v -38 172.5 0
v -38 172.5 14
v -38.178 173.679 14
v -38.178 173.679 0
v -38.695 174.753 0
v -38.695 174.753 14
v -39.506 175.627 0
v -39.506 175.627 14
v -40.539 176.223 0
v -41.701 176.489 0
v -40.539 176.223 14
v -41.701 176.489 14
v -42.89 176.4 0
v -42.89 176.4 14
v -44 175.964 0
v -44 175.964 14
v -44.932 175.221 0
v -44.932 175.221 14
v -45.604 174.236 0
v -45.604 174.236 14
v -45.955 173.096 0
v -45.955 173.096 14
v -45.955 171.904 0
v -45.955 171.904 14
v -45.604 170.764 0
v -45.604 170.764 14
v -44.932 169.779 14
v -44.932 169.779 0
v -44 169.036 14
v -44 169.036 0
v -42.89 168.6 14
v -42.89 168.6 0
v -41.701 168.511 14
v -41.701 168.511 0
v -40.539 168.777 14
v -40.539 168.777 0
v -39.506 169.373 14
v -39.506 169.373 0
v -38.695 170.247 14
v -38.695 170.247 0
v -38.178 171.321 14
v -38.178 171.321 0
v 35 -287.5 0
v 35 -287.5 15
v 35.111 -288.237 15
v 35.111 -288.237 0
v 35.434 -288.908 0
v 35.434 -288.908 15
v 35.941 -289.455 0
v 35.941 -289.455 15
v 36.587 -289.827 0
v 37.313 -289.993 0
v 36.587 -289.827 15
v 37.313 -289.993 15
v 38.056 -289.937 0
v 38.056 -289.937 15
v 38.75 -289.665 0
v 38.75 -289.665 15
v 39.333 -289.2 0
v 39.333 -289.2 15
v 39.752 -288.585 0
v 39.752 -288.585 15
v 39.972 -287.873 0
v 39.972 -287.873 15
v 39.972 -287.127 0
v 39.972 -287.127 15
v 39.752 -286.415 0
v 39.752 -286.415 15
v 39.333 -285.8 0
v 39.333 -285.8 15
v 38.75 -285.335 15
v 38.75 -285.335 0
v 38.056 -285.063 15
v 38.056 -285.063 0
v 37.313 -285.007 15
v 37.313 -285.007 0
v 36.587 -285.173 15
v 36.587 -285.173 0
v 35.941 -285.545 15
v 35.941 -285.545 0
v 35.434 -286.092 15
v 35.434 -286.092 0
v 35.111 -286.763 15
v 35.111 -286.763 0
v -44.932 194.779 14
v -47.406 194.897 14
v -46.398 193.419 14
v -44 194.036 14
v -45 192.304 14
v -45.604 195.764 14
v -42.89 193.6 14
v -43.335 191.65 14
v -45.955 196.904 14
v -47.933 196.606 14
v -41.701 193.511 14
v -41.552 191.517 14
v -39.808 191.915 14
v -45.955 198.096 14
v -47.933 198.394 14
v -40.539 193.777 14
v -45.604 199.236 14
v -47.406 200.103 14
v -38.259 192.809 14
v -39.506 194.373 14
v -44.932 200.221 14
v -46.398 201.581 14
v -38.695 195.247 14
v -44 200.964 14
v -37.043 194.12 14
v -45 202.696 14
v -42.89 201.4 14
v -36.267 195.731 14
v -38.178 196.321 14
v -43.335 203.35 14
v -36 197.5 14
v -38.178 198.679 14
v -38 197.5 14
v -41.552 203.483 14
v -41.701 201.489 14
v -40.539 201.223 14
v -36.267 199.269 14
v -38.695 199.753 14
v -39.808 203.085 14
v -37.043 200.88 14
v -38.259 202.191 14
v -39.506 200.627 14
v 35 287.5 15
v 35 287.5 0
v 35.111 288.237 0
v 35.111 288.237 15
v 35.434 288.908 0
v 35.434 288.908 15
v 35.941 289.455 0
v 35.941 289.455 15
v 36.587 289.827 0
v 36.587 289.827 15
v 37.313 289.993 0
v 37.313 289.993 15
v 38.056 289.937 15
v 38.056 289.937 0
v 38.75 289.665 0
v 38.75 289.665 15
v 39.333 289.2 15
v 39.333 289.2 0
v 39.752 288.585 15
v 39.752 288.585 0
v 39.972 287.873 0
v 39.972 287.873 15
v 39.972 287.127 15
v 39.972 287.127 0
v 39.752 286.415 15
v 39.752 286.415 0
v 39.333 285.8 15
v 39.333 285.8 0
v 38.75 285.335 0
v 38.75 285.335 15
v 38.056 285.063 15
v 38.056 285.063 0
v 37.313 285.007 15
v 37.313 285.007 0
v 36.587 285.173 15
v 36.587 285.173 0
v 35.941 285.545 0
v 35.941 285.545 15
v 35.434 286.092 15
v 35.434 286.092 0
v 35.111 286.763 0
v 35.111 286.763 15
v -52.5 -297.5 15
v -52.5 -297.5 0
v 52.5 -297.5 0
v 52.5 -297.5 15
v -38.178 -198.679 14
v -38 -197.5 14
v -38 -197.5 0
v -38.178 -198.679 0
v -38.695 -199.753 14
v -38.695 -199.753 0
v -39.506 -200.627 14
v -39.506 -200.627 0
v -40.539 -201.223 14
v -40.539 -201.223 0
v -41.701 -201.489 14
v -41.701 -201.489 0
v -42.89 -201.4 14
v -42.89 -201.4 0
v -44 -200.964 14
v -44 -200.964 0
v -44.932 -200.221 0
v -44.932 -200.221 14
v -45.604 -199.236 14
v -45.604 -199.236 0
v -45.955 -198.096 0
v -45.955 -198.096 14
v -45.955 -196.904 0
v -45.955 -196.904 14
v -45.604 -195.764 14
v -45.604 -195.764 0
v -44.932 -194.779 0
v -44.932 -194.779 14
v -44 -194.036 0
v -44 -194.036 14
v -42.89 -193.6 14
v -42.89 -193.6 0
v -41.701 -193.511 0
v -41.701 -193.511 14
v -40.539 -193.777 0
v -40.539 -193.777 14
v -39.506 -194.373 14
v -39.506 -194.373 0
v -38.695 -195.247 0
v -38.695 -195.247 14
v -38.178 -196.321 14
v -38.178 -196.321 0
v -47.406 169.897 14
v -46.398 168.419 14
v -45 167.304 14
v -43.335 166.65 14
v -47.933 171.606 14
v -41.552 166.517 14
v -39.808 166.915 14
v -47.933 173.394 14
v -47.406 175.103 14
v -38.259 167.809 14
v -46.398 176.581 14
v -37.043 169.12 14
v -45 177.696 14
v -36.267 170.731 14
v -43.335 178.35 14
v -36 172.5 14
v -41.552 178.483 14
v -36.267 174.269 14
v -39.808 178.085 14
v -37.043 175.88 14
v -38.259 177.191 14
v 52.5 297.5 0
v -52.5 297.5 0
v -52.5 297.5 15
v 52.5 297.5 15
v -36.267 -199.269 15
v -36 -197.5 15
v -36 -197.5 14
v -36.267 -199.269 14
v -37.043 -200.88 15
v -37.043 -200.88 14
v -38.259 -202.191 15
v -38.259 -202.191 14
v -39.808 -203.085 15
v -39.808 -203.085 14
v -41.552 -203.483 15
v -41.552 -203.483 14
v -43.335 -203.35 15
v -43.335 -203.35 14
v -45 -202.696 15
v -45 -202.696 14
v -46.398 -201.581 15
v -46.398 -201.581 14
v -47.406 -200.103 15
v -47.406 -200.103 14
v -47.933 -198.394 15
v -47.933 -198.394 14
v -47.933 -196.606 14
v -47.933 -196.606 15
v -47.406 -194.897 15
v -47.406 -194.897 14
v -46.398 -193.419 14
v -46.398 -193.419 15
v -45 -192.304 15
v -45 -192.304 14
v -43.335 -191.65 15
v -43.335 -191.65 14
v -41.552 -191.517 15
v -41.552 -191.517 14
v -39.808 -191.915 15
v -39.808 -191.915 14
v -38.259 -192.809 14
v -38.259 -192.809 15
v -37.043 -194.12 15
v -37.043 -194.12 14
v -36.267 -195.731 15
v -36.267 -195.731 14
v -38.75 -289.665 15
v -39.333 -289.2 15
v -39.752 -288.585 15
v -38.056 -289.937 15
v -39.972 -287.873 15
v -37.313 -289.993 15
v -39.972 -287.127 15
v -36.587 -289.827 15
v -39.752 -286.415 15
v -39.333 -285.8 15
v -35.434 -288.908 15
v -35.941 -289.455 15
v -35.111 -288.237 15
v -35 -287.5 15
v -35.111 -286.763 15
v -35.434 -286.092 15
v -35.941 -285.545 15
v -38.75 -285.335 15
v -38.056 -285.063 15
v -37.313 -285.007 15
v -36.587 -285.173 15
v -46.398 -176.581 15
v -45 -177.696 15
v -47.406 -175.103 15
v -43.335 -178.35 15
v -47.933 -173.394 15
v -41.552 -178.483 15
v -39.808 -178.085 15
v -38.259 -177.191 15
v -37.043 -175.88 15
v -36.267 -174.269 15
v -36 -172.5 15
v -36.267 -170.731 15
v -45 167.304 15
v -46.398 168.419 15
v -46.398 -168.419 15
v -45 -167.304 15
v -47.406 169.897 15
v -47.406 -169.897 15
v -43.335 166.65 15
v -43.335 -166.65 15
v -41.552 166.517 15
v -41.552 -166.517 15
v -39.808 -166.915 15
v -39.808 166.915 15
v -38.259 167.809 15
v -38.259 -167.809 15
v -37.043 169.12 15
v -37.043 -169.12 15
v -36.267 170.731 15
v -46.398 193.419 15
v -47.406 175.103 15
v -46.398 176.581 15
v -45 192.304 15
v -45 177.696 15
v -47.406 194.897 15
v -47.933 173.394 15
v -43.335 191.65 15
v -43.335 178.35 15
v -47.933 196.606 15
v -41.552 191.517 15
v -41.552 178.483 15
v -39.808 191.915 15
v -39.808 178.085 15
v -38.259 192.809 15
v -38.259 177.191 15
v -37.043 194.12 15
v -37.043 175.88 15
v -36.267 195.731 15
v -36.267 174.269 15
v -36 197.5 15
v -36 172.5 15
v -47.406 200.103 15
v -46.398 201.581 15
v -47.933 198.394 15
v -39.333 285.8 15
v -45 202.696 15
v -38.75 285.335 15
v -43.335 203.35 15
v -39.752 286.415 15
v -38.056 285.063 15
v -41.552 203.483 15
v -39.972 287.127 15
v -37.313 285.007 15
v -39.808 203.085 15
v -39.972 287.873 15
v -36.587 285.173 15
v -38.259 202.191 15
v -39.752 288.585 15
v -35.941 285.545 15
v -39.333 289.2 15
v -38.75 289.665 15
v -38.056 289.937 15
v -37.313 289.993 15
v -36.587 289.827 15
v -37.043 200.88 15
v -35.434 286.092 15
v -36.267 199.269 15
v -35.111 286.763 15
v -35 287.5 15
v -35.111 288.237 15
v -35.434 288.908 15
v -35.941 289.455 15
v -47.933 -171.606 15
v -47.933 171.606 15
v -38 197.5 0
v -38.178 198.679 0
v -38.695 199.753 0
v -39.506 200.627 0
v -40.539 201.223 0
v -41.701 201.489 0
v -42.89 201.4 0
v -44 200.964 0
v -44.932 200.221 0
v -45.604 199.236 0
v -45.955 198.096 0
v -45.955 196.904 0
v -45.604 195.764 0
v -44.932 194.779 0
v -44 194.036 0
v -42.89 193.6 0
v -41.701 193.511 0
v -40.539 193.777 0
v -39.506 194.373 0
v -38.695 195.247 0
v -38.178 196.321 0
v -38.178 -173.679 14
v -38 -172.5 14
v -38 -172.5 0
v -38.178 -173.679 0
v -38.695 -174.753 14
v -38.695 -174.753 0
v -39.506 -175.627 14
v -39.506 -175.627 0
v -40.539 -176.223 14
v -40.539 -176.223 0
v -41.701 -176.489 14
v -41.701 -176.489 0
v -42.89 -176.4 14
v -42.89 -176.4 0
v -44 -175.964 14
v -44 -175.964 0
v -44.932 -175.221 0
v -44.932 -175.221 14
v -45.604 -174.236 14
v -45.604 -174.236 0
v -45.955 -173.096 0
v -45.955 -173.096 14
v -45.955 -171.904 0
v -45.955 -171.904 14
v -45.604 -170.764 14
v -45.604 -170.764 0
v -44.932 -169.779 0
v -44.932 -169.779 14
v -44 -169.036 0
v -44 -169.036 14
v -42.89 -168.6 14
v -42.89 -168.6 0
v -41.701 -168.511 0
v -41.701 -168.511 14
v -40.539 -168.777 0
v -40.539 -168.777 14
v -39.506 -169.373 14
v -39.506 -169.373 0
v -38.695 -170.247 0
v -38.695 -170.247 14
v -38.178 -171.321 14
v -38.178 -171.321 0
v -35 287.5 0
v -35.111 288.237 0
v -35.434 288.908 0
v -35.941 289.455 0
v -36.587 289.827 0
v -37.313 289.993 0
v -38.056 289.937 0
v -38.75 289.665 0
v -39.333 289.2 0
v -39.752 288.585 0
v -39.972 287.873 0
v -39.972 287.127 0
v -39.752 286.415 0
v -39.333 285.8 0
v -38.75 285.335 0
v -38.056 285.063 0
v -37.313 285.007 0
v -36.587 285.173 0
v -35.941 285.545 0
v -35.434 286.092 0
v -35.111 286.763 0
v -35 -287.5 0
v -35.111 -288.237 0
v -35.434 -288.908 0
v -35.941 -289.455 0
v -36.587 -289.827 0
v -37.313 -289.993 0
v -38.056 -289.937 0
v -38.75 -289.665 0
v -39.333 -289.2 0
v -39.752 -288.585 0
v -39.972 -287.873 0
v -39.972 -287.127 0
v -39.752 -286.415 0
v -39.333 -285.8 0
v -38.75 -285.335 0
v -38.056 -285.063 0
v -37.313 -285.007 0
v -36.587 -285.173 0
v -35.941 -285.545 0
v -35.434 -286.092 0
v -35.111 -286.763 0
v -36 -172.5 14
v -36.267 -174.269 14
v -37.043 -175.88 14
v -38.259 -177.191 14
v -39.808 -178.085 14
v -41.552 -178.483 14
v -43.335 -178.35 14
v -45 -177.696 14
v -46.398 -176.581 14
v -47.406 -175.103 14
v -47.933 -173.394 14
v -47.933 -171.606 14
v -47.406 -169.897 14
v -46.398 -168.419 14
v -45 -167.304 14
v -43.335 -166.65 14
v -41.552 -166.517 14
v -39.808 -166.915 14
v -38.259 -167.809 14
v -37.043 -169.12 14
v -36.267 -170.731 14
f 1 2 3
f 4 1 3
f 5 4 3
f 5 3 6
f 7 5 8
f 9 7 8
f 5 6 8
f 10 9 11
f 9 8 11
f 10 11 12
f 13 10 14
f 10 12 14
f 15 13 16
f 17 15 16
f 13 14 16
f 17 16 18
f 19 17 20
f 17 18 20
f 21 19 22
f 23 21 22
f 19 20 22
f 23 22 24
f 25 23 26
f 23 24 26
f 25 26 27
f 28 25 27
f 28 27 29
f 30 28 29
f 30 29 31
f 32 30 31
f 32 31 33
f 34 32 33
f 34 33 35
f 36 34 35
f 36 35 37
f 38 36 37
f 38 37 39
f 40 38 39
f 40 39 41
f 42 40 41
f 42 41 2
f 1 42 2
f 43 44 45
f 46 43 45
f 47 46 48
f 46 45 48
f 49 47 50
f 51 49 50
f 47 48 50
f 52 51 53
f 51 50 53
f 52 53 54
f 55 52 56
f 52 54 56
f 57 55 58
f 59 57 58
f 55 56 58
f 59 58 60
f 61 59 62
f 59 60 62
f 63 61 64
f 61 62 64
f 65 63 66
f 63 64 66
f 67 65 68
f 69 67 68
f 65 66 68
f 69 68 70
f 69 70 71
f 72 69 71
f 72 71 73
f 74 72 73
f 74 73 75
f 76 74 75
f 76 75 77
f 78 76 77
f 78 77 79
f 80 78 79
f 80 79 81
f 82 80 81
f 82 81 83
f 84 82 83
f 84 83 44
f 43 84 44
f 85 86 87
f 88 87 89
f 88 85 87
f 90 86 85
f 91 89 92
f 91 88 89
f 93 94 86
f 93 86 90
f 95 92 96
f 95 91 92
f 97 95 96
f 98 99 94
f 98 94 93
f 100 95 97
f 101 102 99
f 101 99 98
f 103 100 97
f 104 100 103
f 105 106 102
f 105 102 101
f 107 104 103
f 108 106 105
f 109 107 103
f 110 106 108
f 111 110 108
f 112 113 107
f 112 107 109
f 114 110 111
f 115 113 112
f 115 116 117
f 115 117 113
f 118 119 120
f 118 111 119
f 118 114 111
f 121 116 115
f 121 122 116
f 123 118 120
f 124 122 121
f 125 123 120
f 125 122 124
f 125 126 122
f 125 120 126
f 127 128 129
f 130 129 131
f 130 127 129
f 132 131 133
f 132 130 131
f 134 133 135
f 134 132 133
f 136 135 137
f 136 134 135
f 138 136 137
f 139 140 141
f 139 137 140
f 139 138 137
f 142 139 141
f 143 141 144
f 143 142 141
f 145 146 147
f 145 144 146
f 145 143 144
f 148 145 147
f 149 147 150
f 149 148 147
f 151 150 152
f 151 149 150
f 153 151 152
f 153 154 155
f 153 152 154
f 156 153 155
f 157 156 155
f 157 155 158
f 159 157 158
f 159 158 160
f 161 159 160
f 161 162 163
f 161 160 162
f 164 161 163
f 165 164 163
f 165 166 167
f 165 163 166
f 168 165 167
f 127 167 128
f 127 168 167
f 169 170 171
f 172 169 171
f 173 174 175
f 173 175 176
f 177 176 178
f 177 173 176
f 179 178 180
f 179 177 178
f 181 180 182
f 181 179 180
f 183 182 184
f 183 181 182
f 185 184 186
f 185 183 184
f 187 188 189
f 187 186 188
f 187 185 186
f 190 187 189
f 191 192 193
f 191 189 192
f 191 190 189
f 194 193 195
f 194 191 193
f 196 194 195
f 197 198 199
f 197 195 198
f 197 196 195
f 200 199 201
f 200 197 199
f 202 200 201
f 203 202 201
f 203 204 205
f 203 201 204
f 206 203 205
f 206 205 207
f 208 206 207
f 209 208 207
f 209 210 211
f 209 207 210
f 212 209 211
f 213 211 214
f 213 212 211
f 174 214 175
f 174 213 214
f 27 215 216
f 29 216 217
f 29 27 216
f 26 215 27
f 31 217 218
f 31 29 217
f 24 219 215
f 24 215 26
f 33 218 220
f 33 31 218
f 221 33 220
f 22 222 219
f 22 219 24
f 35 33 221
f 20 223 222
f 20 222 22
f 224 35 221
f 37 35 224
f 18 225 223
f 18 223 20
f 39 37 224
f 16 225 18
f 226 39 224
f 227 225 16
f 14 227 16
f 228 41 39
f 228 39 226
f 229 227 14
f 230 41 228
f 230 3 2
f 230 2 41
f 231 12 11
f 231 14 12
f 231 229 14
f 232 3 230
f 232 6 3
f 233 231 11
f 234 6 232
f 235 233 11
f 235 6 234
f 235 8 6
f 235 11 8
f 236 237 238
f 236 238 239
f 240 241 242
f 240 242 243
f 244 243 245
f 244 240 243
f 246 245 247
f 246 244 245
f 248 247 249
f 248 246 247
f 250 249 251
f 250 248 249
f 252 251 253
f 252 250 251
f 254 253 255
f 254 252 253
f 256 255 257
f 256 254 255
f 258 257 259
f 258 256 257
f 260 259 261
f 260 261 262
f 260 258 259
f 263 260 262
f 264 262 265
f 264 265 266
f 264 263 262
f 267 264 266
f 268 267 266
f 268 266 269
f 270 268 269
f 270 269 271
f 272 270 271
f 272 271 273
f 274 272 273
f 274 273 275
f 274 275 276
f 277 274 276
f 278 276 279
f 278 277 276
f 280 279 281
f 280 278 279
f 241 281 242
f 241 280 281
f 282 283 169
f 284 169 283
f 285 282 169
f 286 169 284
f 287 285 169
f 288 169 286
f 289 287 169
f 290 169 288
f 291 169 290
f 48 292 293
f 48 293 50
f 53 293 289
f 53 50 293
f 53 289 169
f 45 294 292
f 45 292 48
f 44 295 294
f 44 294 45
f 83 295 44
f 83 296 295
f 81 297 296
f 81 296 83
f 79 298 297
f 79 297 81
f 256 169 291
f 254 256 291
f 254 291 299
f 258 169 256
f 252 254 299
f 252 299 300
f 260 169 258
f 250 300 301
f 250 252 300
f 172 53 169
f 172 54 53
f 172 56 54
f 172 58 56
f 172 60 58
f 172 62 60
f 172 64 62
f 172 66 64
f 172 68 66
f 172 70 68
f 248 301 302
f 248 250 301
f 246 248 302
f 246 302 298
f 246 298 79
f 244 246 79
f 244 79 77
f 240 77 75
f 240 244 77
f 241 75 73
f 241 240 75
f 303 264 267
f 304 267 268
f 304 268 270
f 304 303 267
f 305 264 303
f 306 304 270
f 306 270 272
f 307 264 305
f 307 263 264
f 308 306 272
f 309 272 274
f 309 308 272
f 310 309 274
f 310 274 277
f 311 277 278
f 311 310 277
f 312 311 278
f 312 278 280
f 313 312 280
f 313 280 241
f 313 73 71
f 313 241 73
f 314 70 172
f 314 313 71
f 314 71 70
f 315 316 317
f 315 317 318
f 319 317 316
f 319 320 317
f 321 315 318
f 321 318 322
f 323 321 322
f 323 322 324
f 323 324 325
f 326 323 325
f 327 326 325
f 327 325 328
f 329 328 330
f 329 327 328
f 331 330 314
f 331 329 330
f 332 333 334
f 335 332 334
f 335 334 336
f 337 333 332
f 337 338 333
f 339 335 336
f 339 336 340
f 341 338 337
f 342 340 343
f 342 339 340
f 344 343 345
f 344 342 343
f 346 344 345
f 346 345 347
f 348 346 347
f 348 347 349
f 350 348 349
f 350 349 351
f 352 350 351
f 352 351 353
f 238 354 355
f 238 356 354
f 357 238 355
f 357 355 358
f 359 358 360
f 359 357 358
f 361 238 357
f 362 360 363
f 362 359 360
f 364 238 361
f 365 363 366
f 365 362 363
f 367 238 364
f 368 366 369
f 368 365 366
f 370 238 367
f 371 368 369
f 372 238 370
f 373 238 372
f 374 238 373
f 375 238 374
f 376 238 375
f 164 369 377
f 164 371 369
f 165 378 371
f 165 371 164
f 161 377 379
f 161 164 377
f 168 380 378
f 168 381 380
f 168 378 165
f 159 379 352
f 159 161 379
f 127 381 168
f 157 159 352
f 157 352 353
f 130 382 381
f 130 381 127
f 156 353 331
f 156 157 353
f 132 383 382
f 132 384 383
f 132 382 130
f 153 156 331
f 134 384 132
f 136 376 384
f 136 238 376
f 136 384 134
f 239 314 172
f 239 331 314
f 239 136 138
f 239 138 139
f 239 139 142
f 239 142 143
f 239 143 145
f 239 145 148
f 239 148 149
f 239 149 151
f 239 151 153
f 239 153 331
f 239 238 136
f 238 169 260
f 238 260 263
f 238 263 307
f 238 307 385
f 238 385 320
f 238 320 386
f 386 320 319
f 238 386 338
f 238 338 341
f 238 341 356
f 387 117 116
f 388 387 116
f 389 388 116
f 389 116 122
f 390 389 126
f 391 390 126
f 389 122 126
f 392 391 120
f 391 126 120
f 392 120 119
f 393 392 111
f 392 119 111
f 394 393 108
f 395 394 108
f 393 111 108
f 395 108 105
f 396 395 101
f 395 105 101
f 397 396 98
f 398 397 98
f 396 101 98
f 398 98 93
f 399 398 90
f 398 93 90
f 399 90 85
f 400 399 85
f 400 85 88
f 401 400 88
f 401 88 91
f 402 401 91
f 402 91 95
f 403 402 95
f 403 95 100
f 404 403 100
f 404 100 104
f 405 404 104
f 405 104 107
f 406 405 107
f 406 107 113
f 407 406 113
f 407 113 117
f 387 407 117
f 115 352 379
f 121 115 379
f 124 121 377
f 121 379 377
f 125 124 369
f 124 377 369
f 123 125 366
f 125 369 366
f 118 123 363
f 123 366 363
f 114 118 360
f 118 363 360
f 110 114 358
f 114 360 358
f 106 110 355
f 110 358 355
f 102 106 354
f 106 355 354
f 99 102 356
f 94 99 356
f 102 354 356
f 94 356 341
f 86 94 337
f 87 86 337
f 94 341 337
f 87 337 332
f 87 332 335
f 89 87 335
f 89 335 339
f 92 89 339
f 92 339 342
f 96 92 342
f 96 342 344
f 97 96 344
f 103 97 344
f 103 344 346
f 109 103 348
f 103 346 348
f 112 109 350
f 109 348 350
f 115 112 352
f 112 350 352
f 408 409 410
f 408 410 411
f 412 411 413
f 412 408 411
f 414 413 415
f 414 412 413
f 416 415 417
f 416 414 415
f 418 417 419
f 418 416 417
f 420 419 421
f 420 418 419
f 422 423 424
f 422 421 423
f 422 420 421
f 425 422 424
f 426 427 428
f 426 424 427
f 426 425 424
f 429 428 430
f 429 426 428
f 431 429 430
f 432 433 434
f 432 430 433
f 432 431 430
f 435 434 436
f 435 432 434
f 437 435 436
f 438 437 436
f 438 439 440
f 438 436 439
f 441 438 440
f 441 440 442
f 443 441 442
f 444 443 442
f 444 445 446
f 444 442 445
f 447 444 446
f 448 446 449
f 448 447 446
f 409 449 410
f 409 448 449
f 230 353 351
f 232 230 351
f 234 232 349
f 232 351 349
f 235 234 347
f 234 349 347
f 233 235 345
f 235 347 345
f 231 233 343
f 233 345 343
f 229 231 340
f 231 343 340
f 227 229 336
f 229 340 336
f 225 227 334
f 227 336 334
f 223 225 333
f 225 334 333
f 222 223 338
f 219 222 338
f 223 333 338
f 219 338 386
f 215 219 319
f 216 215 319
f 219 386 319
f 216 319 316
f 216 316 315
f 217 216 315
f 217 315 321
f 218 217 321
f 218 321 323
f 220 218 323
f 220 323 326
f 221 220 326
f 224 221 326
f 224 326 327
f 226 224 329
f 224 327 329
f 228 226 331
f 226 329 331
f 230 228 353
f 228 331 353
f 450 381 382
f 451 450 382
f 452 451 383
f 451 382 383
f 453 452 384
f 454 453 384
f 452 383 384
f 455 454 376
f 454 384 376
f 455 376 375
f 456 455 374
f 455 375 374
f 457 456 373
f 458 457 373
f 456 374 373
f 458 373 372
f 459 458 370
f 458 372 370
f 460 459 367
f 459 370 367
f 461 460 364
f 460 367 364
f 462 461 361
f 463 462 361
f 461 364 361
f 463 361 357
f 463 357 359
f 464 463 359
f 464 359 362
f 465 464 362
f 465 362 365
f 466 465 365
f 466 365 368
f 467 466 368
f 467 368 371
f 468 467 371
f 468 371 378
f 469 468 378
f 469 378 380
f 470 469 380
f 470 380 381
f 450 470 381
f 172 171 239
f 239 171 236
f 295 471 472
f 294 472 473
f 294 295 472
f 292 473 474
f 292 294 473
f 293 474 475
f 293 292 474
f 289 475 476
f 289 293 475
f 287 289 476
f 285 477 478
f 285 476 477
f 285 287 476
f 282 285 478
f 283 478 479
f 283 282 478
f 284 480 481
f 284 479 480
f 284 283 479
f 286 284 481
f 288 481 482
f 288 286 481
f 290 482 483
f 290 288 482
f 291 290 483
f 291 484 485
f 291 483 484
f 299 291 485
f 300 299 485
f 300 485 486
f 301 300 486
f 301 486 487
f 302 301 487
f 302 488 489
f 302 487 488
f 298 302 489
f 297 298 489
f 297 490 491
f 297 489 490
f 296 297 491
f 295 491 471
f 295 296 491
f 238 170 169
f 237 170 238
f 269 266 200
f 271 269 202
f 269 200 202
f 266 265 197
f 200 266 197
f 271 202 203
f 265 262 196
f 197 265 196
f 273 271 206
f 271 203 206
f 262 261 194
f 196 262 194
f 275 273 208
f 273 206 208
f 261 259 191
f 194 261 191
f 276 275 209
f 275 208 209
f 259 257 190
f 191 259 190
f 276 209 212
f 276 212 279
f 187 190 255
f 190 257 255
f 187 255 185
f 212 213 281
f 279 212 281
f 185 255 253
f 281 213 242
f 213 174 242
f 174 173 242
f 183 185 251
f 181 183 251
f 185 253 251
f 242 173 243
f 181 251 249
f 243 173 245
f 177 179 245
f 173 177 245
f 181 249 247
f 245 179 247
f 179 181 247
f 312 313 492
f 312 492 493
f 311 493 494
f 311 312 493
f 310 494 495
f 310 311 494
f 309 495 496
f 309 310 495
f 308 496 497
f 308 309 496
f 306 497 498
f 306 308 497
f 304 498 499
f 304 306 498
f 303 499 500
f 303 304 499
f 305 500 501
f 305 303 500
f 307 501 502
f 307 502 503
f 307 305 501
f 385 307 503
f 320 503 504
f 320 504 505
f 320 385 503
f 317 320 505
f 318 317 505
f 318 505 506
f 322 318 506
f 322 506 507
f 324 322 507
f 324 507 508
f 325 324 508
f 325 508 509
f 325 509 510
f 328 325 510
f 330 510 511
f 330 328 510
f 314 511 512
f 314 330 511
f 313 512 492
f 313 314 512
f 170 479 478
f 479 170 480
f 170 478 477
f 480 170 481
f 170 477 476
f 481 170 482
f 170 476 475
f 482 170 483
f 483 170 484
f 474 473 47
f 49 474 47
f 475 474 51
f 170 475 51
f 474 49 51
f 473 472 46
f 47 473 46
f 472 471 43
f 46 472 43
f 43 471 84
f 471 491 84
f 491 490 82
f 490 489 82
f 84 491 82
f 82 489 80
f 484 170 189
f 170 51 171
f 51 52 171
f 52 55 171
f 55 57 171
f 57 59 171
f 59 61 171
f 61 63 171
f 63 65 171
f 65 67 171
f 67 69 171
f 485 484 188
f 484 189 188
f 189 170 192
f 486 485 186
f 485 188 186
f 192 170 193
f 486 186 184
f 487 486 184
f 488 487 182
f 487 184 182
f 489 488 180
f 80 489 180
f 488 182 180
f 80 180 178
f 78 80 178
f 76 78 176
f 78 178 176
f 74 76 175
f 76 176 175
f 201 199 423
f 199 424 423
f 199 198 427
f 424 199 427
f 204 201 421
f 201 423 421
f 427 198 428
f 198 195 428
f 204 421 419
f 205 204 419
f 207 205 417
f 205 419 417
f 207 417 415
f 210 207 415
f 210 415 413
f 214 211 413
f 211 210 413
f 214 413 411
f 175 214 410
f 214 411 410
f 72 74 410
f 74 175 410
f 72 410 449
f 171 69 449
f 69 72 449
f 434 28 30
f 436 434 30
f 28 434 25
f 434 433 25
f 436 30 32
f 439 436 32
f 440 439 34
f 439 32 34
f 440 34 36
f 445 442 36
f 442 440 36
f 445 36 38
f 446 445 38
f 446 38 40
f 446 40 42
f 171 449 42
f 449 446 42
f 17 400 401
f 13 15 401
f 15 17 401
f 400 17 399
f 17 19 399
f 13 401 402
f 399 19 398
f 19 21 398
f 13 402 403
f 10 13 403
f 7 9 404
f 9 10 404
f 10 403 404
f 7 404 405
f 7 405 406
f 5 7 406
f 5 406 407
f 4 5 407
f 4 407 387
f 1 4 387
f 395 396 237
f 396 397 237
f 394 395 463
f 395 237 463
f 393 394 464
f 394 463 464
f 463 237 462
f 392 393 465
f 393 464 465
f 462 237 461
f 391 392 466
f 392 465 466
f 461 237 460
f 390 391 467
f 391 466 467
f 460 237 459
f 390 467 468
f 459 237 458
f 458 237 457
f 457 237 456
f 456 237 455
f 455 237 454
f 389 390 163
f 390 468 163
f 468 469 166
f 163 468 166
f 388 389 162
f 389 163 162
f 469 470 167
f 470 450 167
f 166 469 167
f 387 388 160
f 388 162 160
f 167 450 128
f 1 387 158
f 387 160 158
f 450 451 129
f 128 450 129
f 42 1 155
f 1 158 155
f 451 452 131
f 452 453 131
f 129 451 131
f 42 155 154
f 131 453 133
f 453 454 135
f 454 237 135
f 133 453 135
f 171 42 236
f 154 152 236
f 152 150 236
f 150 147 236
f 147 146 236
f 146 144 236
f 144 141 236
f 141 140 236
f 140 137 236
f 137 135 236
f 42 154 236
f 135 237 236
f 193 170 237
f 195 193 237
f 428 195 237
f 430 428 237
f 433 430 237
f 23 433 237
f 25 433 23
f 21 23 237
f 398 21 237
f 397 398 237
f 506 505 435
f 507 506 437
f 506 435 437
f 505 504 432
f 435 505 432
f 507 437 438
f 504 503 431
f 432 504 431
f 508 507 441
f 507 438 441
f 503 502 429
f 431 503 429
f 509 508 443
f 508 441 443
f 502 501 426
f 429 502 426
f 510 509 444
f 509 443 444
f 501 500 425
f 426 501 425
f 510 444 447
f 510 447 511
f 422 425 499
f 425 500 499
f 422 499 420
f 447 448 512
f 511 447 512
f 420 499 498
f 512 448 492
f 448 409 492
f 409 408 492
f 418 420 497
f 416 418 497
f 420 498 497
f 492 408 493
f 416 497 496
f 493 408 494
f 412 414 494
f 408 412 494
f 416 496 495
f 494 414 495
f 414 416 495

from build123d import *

# Parameters (mm, degrees)
SKETCH_1_W               = 105
SKETCH_1_H               = 595
EXTRUDE_1_DEPTH          = 15
SKETCH_2_R               = 4
CUT_EXTRUDE_2_DEPTH      = 303.469006677
SKETCH_2_5_R             = 2.5
CUT_EXTRUDE_3_DEPTH      = 303.469006677
MIRROR_3_COPY_1_SKETCH_R = 2.5
MIRROR_3_COPY_1_DEPTH    = 303.469006677
MIRROR_3_COPY_2_SKETCH_R = 2.5
MIRROR_3_COPY_2_DEPTH    = 303.469006677
SKETCH_3_R               = 6
CUT_EXTRUDE_4_DEPTH      = 1


with BuildPart() as part:
    # ｽｹｯﾁ1 → ﾎﾞｽ - 押し出し1 (new body)
    with BuildSketch(Plane.XY):
        Rectangle(SKETCH_1_W, SKETCH_1_H)
    extrude(amount=EXTRUDE_1_DEPTH)

    # ｽｹｯﾁ2 → ｶｯﾄ - 押し出し2 (cut, through all)
    with BuildSketch(Plane.XY.offset(15)):
        with Locations((-42, 197.5)):
            Circle(SKETCH_2_R)
        with Locations((-42, 172.5)):
            Circle(SKETCH_2_R)
    cut_extrude_2 = extrude(amount=-CUT_EXTRUDE_2_DEPTH, mode=Mode.SUBTRACT)

    # ｽｹｯﾁ2<5> → ｶｯﾄ - 押し出し3 (cut, through all)
    with BuildSketch(Plane.XY.offset(15)):
        with Locations((-37.5, 287.5)):
            Circle(SKETCH_2_5_R)
    cut_extrude_3 = extrude(amount=-CUT_EXTRUDE_3_DEPTH, mode=Mode.SUBTRACT)

    # ﾐﾗｰ1: ｶｯﾄ - 押し出し3 across plane
    add(cut_extrude_3.mirror(Plane.ZX), mode=Mode.SUBTRACT)

    # ﾐﾗｰ2: ｶｯﾄ - 押し出し2 across plane
    add(cut_extrude_2.mirror(Plane.ZX), mode=Mode.SUBTRACT)

    # ﾐﾗｰ3 copy 1 sketch → ﾐﾗｰ3 copy 1 (cut, through all)
    with BuildSketch(Plane(origin=(0, 0, 15), x_dir=(-1, 0, 0), z_dir=(0, 0, 1))):
        with Locations((-37.5, 287.5)):
            Circle(MIRROR_3_COPY_1_SKETCH_R)
    extrude(amount=-MIRROR_3_COPY_1_DEPTH, mode=Mode.SUBTRACT)

    # ﾐﾗｰ3 copy 2 sketch → ﾐﾗｰ3 copy 2 (cut, through all)
    with BuildSketch(Plane(origin=(0, 0, 15), x_dir=(-1, 0, 0), z_dir=(0, 0, 1))):
        with Locations((-37.5, -287.5)):
            Circle(MIRROR_3_COPY_2_SKETCH_R)
    extrude(amount=-MIRROR_3_COPY_2_DEPTH, mode=Mode.SUBTRACT)

    # ｽｹｯﾁ3 → ｶｯﾄ - 押し出し4 (cut)
    with BuildSketch(Plane.XY.offset(15)):
        with Locations((-42, 197.5)):
            Circle(SKETCH_3_R)
        with Locations((-42, 172.5)):
            Circle(SKETCH_3_R)
    cut_extrude_4 = extrude(amount=-CUT_EXTRUDE_4_DEPTH, mode=Mode.SUBTRACT)

    # ﾐﾗｰ4: ｶｯﾄ - 押し出し4 across plane
    add(cut_extrude_4.mirror(Plane.ZX), mode=Mode.SUBTRACT)


solid = part.part
